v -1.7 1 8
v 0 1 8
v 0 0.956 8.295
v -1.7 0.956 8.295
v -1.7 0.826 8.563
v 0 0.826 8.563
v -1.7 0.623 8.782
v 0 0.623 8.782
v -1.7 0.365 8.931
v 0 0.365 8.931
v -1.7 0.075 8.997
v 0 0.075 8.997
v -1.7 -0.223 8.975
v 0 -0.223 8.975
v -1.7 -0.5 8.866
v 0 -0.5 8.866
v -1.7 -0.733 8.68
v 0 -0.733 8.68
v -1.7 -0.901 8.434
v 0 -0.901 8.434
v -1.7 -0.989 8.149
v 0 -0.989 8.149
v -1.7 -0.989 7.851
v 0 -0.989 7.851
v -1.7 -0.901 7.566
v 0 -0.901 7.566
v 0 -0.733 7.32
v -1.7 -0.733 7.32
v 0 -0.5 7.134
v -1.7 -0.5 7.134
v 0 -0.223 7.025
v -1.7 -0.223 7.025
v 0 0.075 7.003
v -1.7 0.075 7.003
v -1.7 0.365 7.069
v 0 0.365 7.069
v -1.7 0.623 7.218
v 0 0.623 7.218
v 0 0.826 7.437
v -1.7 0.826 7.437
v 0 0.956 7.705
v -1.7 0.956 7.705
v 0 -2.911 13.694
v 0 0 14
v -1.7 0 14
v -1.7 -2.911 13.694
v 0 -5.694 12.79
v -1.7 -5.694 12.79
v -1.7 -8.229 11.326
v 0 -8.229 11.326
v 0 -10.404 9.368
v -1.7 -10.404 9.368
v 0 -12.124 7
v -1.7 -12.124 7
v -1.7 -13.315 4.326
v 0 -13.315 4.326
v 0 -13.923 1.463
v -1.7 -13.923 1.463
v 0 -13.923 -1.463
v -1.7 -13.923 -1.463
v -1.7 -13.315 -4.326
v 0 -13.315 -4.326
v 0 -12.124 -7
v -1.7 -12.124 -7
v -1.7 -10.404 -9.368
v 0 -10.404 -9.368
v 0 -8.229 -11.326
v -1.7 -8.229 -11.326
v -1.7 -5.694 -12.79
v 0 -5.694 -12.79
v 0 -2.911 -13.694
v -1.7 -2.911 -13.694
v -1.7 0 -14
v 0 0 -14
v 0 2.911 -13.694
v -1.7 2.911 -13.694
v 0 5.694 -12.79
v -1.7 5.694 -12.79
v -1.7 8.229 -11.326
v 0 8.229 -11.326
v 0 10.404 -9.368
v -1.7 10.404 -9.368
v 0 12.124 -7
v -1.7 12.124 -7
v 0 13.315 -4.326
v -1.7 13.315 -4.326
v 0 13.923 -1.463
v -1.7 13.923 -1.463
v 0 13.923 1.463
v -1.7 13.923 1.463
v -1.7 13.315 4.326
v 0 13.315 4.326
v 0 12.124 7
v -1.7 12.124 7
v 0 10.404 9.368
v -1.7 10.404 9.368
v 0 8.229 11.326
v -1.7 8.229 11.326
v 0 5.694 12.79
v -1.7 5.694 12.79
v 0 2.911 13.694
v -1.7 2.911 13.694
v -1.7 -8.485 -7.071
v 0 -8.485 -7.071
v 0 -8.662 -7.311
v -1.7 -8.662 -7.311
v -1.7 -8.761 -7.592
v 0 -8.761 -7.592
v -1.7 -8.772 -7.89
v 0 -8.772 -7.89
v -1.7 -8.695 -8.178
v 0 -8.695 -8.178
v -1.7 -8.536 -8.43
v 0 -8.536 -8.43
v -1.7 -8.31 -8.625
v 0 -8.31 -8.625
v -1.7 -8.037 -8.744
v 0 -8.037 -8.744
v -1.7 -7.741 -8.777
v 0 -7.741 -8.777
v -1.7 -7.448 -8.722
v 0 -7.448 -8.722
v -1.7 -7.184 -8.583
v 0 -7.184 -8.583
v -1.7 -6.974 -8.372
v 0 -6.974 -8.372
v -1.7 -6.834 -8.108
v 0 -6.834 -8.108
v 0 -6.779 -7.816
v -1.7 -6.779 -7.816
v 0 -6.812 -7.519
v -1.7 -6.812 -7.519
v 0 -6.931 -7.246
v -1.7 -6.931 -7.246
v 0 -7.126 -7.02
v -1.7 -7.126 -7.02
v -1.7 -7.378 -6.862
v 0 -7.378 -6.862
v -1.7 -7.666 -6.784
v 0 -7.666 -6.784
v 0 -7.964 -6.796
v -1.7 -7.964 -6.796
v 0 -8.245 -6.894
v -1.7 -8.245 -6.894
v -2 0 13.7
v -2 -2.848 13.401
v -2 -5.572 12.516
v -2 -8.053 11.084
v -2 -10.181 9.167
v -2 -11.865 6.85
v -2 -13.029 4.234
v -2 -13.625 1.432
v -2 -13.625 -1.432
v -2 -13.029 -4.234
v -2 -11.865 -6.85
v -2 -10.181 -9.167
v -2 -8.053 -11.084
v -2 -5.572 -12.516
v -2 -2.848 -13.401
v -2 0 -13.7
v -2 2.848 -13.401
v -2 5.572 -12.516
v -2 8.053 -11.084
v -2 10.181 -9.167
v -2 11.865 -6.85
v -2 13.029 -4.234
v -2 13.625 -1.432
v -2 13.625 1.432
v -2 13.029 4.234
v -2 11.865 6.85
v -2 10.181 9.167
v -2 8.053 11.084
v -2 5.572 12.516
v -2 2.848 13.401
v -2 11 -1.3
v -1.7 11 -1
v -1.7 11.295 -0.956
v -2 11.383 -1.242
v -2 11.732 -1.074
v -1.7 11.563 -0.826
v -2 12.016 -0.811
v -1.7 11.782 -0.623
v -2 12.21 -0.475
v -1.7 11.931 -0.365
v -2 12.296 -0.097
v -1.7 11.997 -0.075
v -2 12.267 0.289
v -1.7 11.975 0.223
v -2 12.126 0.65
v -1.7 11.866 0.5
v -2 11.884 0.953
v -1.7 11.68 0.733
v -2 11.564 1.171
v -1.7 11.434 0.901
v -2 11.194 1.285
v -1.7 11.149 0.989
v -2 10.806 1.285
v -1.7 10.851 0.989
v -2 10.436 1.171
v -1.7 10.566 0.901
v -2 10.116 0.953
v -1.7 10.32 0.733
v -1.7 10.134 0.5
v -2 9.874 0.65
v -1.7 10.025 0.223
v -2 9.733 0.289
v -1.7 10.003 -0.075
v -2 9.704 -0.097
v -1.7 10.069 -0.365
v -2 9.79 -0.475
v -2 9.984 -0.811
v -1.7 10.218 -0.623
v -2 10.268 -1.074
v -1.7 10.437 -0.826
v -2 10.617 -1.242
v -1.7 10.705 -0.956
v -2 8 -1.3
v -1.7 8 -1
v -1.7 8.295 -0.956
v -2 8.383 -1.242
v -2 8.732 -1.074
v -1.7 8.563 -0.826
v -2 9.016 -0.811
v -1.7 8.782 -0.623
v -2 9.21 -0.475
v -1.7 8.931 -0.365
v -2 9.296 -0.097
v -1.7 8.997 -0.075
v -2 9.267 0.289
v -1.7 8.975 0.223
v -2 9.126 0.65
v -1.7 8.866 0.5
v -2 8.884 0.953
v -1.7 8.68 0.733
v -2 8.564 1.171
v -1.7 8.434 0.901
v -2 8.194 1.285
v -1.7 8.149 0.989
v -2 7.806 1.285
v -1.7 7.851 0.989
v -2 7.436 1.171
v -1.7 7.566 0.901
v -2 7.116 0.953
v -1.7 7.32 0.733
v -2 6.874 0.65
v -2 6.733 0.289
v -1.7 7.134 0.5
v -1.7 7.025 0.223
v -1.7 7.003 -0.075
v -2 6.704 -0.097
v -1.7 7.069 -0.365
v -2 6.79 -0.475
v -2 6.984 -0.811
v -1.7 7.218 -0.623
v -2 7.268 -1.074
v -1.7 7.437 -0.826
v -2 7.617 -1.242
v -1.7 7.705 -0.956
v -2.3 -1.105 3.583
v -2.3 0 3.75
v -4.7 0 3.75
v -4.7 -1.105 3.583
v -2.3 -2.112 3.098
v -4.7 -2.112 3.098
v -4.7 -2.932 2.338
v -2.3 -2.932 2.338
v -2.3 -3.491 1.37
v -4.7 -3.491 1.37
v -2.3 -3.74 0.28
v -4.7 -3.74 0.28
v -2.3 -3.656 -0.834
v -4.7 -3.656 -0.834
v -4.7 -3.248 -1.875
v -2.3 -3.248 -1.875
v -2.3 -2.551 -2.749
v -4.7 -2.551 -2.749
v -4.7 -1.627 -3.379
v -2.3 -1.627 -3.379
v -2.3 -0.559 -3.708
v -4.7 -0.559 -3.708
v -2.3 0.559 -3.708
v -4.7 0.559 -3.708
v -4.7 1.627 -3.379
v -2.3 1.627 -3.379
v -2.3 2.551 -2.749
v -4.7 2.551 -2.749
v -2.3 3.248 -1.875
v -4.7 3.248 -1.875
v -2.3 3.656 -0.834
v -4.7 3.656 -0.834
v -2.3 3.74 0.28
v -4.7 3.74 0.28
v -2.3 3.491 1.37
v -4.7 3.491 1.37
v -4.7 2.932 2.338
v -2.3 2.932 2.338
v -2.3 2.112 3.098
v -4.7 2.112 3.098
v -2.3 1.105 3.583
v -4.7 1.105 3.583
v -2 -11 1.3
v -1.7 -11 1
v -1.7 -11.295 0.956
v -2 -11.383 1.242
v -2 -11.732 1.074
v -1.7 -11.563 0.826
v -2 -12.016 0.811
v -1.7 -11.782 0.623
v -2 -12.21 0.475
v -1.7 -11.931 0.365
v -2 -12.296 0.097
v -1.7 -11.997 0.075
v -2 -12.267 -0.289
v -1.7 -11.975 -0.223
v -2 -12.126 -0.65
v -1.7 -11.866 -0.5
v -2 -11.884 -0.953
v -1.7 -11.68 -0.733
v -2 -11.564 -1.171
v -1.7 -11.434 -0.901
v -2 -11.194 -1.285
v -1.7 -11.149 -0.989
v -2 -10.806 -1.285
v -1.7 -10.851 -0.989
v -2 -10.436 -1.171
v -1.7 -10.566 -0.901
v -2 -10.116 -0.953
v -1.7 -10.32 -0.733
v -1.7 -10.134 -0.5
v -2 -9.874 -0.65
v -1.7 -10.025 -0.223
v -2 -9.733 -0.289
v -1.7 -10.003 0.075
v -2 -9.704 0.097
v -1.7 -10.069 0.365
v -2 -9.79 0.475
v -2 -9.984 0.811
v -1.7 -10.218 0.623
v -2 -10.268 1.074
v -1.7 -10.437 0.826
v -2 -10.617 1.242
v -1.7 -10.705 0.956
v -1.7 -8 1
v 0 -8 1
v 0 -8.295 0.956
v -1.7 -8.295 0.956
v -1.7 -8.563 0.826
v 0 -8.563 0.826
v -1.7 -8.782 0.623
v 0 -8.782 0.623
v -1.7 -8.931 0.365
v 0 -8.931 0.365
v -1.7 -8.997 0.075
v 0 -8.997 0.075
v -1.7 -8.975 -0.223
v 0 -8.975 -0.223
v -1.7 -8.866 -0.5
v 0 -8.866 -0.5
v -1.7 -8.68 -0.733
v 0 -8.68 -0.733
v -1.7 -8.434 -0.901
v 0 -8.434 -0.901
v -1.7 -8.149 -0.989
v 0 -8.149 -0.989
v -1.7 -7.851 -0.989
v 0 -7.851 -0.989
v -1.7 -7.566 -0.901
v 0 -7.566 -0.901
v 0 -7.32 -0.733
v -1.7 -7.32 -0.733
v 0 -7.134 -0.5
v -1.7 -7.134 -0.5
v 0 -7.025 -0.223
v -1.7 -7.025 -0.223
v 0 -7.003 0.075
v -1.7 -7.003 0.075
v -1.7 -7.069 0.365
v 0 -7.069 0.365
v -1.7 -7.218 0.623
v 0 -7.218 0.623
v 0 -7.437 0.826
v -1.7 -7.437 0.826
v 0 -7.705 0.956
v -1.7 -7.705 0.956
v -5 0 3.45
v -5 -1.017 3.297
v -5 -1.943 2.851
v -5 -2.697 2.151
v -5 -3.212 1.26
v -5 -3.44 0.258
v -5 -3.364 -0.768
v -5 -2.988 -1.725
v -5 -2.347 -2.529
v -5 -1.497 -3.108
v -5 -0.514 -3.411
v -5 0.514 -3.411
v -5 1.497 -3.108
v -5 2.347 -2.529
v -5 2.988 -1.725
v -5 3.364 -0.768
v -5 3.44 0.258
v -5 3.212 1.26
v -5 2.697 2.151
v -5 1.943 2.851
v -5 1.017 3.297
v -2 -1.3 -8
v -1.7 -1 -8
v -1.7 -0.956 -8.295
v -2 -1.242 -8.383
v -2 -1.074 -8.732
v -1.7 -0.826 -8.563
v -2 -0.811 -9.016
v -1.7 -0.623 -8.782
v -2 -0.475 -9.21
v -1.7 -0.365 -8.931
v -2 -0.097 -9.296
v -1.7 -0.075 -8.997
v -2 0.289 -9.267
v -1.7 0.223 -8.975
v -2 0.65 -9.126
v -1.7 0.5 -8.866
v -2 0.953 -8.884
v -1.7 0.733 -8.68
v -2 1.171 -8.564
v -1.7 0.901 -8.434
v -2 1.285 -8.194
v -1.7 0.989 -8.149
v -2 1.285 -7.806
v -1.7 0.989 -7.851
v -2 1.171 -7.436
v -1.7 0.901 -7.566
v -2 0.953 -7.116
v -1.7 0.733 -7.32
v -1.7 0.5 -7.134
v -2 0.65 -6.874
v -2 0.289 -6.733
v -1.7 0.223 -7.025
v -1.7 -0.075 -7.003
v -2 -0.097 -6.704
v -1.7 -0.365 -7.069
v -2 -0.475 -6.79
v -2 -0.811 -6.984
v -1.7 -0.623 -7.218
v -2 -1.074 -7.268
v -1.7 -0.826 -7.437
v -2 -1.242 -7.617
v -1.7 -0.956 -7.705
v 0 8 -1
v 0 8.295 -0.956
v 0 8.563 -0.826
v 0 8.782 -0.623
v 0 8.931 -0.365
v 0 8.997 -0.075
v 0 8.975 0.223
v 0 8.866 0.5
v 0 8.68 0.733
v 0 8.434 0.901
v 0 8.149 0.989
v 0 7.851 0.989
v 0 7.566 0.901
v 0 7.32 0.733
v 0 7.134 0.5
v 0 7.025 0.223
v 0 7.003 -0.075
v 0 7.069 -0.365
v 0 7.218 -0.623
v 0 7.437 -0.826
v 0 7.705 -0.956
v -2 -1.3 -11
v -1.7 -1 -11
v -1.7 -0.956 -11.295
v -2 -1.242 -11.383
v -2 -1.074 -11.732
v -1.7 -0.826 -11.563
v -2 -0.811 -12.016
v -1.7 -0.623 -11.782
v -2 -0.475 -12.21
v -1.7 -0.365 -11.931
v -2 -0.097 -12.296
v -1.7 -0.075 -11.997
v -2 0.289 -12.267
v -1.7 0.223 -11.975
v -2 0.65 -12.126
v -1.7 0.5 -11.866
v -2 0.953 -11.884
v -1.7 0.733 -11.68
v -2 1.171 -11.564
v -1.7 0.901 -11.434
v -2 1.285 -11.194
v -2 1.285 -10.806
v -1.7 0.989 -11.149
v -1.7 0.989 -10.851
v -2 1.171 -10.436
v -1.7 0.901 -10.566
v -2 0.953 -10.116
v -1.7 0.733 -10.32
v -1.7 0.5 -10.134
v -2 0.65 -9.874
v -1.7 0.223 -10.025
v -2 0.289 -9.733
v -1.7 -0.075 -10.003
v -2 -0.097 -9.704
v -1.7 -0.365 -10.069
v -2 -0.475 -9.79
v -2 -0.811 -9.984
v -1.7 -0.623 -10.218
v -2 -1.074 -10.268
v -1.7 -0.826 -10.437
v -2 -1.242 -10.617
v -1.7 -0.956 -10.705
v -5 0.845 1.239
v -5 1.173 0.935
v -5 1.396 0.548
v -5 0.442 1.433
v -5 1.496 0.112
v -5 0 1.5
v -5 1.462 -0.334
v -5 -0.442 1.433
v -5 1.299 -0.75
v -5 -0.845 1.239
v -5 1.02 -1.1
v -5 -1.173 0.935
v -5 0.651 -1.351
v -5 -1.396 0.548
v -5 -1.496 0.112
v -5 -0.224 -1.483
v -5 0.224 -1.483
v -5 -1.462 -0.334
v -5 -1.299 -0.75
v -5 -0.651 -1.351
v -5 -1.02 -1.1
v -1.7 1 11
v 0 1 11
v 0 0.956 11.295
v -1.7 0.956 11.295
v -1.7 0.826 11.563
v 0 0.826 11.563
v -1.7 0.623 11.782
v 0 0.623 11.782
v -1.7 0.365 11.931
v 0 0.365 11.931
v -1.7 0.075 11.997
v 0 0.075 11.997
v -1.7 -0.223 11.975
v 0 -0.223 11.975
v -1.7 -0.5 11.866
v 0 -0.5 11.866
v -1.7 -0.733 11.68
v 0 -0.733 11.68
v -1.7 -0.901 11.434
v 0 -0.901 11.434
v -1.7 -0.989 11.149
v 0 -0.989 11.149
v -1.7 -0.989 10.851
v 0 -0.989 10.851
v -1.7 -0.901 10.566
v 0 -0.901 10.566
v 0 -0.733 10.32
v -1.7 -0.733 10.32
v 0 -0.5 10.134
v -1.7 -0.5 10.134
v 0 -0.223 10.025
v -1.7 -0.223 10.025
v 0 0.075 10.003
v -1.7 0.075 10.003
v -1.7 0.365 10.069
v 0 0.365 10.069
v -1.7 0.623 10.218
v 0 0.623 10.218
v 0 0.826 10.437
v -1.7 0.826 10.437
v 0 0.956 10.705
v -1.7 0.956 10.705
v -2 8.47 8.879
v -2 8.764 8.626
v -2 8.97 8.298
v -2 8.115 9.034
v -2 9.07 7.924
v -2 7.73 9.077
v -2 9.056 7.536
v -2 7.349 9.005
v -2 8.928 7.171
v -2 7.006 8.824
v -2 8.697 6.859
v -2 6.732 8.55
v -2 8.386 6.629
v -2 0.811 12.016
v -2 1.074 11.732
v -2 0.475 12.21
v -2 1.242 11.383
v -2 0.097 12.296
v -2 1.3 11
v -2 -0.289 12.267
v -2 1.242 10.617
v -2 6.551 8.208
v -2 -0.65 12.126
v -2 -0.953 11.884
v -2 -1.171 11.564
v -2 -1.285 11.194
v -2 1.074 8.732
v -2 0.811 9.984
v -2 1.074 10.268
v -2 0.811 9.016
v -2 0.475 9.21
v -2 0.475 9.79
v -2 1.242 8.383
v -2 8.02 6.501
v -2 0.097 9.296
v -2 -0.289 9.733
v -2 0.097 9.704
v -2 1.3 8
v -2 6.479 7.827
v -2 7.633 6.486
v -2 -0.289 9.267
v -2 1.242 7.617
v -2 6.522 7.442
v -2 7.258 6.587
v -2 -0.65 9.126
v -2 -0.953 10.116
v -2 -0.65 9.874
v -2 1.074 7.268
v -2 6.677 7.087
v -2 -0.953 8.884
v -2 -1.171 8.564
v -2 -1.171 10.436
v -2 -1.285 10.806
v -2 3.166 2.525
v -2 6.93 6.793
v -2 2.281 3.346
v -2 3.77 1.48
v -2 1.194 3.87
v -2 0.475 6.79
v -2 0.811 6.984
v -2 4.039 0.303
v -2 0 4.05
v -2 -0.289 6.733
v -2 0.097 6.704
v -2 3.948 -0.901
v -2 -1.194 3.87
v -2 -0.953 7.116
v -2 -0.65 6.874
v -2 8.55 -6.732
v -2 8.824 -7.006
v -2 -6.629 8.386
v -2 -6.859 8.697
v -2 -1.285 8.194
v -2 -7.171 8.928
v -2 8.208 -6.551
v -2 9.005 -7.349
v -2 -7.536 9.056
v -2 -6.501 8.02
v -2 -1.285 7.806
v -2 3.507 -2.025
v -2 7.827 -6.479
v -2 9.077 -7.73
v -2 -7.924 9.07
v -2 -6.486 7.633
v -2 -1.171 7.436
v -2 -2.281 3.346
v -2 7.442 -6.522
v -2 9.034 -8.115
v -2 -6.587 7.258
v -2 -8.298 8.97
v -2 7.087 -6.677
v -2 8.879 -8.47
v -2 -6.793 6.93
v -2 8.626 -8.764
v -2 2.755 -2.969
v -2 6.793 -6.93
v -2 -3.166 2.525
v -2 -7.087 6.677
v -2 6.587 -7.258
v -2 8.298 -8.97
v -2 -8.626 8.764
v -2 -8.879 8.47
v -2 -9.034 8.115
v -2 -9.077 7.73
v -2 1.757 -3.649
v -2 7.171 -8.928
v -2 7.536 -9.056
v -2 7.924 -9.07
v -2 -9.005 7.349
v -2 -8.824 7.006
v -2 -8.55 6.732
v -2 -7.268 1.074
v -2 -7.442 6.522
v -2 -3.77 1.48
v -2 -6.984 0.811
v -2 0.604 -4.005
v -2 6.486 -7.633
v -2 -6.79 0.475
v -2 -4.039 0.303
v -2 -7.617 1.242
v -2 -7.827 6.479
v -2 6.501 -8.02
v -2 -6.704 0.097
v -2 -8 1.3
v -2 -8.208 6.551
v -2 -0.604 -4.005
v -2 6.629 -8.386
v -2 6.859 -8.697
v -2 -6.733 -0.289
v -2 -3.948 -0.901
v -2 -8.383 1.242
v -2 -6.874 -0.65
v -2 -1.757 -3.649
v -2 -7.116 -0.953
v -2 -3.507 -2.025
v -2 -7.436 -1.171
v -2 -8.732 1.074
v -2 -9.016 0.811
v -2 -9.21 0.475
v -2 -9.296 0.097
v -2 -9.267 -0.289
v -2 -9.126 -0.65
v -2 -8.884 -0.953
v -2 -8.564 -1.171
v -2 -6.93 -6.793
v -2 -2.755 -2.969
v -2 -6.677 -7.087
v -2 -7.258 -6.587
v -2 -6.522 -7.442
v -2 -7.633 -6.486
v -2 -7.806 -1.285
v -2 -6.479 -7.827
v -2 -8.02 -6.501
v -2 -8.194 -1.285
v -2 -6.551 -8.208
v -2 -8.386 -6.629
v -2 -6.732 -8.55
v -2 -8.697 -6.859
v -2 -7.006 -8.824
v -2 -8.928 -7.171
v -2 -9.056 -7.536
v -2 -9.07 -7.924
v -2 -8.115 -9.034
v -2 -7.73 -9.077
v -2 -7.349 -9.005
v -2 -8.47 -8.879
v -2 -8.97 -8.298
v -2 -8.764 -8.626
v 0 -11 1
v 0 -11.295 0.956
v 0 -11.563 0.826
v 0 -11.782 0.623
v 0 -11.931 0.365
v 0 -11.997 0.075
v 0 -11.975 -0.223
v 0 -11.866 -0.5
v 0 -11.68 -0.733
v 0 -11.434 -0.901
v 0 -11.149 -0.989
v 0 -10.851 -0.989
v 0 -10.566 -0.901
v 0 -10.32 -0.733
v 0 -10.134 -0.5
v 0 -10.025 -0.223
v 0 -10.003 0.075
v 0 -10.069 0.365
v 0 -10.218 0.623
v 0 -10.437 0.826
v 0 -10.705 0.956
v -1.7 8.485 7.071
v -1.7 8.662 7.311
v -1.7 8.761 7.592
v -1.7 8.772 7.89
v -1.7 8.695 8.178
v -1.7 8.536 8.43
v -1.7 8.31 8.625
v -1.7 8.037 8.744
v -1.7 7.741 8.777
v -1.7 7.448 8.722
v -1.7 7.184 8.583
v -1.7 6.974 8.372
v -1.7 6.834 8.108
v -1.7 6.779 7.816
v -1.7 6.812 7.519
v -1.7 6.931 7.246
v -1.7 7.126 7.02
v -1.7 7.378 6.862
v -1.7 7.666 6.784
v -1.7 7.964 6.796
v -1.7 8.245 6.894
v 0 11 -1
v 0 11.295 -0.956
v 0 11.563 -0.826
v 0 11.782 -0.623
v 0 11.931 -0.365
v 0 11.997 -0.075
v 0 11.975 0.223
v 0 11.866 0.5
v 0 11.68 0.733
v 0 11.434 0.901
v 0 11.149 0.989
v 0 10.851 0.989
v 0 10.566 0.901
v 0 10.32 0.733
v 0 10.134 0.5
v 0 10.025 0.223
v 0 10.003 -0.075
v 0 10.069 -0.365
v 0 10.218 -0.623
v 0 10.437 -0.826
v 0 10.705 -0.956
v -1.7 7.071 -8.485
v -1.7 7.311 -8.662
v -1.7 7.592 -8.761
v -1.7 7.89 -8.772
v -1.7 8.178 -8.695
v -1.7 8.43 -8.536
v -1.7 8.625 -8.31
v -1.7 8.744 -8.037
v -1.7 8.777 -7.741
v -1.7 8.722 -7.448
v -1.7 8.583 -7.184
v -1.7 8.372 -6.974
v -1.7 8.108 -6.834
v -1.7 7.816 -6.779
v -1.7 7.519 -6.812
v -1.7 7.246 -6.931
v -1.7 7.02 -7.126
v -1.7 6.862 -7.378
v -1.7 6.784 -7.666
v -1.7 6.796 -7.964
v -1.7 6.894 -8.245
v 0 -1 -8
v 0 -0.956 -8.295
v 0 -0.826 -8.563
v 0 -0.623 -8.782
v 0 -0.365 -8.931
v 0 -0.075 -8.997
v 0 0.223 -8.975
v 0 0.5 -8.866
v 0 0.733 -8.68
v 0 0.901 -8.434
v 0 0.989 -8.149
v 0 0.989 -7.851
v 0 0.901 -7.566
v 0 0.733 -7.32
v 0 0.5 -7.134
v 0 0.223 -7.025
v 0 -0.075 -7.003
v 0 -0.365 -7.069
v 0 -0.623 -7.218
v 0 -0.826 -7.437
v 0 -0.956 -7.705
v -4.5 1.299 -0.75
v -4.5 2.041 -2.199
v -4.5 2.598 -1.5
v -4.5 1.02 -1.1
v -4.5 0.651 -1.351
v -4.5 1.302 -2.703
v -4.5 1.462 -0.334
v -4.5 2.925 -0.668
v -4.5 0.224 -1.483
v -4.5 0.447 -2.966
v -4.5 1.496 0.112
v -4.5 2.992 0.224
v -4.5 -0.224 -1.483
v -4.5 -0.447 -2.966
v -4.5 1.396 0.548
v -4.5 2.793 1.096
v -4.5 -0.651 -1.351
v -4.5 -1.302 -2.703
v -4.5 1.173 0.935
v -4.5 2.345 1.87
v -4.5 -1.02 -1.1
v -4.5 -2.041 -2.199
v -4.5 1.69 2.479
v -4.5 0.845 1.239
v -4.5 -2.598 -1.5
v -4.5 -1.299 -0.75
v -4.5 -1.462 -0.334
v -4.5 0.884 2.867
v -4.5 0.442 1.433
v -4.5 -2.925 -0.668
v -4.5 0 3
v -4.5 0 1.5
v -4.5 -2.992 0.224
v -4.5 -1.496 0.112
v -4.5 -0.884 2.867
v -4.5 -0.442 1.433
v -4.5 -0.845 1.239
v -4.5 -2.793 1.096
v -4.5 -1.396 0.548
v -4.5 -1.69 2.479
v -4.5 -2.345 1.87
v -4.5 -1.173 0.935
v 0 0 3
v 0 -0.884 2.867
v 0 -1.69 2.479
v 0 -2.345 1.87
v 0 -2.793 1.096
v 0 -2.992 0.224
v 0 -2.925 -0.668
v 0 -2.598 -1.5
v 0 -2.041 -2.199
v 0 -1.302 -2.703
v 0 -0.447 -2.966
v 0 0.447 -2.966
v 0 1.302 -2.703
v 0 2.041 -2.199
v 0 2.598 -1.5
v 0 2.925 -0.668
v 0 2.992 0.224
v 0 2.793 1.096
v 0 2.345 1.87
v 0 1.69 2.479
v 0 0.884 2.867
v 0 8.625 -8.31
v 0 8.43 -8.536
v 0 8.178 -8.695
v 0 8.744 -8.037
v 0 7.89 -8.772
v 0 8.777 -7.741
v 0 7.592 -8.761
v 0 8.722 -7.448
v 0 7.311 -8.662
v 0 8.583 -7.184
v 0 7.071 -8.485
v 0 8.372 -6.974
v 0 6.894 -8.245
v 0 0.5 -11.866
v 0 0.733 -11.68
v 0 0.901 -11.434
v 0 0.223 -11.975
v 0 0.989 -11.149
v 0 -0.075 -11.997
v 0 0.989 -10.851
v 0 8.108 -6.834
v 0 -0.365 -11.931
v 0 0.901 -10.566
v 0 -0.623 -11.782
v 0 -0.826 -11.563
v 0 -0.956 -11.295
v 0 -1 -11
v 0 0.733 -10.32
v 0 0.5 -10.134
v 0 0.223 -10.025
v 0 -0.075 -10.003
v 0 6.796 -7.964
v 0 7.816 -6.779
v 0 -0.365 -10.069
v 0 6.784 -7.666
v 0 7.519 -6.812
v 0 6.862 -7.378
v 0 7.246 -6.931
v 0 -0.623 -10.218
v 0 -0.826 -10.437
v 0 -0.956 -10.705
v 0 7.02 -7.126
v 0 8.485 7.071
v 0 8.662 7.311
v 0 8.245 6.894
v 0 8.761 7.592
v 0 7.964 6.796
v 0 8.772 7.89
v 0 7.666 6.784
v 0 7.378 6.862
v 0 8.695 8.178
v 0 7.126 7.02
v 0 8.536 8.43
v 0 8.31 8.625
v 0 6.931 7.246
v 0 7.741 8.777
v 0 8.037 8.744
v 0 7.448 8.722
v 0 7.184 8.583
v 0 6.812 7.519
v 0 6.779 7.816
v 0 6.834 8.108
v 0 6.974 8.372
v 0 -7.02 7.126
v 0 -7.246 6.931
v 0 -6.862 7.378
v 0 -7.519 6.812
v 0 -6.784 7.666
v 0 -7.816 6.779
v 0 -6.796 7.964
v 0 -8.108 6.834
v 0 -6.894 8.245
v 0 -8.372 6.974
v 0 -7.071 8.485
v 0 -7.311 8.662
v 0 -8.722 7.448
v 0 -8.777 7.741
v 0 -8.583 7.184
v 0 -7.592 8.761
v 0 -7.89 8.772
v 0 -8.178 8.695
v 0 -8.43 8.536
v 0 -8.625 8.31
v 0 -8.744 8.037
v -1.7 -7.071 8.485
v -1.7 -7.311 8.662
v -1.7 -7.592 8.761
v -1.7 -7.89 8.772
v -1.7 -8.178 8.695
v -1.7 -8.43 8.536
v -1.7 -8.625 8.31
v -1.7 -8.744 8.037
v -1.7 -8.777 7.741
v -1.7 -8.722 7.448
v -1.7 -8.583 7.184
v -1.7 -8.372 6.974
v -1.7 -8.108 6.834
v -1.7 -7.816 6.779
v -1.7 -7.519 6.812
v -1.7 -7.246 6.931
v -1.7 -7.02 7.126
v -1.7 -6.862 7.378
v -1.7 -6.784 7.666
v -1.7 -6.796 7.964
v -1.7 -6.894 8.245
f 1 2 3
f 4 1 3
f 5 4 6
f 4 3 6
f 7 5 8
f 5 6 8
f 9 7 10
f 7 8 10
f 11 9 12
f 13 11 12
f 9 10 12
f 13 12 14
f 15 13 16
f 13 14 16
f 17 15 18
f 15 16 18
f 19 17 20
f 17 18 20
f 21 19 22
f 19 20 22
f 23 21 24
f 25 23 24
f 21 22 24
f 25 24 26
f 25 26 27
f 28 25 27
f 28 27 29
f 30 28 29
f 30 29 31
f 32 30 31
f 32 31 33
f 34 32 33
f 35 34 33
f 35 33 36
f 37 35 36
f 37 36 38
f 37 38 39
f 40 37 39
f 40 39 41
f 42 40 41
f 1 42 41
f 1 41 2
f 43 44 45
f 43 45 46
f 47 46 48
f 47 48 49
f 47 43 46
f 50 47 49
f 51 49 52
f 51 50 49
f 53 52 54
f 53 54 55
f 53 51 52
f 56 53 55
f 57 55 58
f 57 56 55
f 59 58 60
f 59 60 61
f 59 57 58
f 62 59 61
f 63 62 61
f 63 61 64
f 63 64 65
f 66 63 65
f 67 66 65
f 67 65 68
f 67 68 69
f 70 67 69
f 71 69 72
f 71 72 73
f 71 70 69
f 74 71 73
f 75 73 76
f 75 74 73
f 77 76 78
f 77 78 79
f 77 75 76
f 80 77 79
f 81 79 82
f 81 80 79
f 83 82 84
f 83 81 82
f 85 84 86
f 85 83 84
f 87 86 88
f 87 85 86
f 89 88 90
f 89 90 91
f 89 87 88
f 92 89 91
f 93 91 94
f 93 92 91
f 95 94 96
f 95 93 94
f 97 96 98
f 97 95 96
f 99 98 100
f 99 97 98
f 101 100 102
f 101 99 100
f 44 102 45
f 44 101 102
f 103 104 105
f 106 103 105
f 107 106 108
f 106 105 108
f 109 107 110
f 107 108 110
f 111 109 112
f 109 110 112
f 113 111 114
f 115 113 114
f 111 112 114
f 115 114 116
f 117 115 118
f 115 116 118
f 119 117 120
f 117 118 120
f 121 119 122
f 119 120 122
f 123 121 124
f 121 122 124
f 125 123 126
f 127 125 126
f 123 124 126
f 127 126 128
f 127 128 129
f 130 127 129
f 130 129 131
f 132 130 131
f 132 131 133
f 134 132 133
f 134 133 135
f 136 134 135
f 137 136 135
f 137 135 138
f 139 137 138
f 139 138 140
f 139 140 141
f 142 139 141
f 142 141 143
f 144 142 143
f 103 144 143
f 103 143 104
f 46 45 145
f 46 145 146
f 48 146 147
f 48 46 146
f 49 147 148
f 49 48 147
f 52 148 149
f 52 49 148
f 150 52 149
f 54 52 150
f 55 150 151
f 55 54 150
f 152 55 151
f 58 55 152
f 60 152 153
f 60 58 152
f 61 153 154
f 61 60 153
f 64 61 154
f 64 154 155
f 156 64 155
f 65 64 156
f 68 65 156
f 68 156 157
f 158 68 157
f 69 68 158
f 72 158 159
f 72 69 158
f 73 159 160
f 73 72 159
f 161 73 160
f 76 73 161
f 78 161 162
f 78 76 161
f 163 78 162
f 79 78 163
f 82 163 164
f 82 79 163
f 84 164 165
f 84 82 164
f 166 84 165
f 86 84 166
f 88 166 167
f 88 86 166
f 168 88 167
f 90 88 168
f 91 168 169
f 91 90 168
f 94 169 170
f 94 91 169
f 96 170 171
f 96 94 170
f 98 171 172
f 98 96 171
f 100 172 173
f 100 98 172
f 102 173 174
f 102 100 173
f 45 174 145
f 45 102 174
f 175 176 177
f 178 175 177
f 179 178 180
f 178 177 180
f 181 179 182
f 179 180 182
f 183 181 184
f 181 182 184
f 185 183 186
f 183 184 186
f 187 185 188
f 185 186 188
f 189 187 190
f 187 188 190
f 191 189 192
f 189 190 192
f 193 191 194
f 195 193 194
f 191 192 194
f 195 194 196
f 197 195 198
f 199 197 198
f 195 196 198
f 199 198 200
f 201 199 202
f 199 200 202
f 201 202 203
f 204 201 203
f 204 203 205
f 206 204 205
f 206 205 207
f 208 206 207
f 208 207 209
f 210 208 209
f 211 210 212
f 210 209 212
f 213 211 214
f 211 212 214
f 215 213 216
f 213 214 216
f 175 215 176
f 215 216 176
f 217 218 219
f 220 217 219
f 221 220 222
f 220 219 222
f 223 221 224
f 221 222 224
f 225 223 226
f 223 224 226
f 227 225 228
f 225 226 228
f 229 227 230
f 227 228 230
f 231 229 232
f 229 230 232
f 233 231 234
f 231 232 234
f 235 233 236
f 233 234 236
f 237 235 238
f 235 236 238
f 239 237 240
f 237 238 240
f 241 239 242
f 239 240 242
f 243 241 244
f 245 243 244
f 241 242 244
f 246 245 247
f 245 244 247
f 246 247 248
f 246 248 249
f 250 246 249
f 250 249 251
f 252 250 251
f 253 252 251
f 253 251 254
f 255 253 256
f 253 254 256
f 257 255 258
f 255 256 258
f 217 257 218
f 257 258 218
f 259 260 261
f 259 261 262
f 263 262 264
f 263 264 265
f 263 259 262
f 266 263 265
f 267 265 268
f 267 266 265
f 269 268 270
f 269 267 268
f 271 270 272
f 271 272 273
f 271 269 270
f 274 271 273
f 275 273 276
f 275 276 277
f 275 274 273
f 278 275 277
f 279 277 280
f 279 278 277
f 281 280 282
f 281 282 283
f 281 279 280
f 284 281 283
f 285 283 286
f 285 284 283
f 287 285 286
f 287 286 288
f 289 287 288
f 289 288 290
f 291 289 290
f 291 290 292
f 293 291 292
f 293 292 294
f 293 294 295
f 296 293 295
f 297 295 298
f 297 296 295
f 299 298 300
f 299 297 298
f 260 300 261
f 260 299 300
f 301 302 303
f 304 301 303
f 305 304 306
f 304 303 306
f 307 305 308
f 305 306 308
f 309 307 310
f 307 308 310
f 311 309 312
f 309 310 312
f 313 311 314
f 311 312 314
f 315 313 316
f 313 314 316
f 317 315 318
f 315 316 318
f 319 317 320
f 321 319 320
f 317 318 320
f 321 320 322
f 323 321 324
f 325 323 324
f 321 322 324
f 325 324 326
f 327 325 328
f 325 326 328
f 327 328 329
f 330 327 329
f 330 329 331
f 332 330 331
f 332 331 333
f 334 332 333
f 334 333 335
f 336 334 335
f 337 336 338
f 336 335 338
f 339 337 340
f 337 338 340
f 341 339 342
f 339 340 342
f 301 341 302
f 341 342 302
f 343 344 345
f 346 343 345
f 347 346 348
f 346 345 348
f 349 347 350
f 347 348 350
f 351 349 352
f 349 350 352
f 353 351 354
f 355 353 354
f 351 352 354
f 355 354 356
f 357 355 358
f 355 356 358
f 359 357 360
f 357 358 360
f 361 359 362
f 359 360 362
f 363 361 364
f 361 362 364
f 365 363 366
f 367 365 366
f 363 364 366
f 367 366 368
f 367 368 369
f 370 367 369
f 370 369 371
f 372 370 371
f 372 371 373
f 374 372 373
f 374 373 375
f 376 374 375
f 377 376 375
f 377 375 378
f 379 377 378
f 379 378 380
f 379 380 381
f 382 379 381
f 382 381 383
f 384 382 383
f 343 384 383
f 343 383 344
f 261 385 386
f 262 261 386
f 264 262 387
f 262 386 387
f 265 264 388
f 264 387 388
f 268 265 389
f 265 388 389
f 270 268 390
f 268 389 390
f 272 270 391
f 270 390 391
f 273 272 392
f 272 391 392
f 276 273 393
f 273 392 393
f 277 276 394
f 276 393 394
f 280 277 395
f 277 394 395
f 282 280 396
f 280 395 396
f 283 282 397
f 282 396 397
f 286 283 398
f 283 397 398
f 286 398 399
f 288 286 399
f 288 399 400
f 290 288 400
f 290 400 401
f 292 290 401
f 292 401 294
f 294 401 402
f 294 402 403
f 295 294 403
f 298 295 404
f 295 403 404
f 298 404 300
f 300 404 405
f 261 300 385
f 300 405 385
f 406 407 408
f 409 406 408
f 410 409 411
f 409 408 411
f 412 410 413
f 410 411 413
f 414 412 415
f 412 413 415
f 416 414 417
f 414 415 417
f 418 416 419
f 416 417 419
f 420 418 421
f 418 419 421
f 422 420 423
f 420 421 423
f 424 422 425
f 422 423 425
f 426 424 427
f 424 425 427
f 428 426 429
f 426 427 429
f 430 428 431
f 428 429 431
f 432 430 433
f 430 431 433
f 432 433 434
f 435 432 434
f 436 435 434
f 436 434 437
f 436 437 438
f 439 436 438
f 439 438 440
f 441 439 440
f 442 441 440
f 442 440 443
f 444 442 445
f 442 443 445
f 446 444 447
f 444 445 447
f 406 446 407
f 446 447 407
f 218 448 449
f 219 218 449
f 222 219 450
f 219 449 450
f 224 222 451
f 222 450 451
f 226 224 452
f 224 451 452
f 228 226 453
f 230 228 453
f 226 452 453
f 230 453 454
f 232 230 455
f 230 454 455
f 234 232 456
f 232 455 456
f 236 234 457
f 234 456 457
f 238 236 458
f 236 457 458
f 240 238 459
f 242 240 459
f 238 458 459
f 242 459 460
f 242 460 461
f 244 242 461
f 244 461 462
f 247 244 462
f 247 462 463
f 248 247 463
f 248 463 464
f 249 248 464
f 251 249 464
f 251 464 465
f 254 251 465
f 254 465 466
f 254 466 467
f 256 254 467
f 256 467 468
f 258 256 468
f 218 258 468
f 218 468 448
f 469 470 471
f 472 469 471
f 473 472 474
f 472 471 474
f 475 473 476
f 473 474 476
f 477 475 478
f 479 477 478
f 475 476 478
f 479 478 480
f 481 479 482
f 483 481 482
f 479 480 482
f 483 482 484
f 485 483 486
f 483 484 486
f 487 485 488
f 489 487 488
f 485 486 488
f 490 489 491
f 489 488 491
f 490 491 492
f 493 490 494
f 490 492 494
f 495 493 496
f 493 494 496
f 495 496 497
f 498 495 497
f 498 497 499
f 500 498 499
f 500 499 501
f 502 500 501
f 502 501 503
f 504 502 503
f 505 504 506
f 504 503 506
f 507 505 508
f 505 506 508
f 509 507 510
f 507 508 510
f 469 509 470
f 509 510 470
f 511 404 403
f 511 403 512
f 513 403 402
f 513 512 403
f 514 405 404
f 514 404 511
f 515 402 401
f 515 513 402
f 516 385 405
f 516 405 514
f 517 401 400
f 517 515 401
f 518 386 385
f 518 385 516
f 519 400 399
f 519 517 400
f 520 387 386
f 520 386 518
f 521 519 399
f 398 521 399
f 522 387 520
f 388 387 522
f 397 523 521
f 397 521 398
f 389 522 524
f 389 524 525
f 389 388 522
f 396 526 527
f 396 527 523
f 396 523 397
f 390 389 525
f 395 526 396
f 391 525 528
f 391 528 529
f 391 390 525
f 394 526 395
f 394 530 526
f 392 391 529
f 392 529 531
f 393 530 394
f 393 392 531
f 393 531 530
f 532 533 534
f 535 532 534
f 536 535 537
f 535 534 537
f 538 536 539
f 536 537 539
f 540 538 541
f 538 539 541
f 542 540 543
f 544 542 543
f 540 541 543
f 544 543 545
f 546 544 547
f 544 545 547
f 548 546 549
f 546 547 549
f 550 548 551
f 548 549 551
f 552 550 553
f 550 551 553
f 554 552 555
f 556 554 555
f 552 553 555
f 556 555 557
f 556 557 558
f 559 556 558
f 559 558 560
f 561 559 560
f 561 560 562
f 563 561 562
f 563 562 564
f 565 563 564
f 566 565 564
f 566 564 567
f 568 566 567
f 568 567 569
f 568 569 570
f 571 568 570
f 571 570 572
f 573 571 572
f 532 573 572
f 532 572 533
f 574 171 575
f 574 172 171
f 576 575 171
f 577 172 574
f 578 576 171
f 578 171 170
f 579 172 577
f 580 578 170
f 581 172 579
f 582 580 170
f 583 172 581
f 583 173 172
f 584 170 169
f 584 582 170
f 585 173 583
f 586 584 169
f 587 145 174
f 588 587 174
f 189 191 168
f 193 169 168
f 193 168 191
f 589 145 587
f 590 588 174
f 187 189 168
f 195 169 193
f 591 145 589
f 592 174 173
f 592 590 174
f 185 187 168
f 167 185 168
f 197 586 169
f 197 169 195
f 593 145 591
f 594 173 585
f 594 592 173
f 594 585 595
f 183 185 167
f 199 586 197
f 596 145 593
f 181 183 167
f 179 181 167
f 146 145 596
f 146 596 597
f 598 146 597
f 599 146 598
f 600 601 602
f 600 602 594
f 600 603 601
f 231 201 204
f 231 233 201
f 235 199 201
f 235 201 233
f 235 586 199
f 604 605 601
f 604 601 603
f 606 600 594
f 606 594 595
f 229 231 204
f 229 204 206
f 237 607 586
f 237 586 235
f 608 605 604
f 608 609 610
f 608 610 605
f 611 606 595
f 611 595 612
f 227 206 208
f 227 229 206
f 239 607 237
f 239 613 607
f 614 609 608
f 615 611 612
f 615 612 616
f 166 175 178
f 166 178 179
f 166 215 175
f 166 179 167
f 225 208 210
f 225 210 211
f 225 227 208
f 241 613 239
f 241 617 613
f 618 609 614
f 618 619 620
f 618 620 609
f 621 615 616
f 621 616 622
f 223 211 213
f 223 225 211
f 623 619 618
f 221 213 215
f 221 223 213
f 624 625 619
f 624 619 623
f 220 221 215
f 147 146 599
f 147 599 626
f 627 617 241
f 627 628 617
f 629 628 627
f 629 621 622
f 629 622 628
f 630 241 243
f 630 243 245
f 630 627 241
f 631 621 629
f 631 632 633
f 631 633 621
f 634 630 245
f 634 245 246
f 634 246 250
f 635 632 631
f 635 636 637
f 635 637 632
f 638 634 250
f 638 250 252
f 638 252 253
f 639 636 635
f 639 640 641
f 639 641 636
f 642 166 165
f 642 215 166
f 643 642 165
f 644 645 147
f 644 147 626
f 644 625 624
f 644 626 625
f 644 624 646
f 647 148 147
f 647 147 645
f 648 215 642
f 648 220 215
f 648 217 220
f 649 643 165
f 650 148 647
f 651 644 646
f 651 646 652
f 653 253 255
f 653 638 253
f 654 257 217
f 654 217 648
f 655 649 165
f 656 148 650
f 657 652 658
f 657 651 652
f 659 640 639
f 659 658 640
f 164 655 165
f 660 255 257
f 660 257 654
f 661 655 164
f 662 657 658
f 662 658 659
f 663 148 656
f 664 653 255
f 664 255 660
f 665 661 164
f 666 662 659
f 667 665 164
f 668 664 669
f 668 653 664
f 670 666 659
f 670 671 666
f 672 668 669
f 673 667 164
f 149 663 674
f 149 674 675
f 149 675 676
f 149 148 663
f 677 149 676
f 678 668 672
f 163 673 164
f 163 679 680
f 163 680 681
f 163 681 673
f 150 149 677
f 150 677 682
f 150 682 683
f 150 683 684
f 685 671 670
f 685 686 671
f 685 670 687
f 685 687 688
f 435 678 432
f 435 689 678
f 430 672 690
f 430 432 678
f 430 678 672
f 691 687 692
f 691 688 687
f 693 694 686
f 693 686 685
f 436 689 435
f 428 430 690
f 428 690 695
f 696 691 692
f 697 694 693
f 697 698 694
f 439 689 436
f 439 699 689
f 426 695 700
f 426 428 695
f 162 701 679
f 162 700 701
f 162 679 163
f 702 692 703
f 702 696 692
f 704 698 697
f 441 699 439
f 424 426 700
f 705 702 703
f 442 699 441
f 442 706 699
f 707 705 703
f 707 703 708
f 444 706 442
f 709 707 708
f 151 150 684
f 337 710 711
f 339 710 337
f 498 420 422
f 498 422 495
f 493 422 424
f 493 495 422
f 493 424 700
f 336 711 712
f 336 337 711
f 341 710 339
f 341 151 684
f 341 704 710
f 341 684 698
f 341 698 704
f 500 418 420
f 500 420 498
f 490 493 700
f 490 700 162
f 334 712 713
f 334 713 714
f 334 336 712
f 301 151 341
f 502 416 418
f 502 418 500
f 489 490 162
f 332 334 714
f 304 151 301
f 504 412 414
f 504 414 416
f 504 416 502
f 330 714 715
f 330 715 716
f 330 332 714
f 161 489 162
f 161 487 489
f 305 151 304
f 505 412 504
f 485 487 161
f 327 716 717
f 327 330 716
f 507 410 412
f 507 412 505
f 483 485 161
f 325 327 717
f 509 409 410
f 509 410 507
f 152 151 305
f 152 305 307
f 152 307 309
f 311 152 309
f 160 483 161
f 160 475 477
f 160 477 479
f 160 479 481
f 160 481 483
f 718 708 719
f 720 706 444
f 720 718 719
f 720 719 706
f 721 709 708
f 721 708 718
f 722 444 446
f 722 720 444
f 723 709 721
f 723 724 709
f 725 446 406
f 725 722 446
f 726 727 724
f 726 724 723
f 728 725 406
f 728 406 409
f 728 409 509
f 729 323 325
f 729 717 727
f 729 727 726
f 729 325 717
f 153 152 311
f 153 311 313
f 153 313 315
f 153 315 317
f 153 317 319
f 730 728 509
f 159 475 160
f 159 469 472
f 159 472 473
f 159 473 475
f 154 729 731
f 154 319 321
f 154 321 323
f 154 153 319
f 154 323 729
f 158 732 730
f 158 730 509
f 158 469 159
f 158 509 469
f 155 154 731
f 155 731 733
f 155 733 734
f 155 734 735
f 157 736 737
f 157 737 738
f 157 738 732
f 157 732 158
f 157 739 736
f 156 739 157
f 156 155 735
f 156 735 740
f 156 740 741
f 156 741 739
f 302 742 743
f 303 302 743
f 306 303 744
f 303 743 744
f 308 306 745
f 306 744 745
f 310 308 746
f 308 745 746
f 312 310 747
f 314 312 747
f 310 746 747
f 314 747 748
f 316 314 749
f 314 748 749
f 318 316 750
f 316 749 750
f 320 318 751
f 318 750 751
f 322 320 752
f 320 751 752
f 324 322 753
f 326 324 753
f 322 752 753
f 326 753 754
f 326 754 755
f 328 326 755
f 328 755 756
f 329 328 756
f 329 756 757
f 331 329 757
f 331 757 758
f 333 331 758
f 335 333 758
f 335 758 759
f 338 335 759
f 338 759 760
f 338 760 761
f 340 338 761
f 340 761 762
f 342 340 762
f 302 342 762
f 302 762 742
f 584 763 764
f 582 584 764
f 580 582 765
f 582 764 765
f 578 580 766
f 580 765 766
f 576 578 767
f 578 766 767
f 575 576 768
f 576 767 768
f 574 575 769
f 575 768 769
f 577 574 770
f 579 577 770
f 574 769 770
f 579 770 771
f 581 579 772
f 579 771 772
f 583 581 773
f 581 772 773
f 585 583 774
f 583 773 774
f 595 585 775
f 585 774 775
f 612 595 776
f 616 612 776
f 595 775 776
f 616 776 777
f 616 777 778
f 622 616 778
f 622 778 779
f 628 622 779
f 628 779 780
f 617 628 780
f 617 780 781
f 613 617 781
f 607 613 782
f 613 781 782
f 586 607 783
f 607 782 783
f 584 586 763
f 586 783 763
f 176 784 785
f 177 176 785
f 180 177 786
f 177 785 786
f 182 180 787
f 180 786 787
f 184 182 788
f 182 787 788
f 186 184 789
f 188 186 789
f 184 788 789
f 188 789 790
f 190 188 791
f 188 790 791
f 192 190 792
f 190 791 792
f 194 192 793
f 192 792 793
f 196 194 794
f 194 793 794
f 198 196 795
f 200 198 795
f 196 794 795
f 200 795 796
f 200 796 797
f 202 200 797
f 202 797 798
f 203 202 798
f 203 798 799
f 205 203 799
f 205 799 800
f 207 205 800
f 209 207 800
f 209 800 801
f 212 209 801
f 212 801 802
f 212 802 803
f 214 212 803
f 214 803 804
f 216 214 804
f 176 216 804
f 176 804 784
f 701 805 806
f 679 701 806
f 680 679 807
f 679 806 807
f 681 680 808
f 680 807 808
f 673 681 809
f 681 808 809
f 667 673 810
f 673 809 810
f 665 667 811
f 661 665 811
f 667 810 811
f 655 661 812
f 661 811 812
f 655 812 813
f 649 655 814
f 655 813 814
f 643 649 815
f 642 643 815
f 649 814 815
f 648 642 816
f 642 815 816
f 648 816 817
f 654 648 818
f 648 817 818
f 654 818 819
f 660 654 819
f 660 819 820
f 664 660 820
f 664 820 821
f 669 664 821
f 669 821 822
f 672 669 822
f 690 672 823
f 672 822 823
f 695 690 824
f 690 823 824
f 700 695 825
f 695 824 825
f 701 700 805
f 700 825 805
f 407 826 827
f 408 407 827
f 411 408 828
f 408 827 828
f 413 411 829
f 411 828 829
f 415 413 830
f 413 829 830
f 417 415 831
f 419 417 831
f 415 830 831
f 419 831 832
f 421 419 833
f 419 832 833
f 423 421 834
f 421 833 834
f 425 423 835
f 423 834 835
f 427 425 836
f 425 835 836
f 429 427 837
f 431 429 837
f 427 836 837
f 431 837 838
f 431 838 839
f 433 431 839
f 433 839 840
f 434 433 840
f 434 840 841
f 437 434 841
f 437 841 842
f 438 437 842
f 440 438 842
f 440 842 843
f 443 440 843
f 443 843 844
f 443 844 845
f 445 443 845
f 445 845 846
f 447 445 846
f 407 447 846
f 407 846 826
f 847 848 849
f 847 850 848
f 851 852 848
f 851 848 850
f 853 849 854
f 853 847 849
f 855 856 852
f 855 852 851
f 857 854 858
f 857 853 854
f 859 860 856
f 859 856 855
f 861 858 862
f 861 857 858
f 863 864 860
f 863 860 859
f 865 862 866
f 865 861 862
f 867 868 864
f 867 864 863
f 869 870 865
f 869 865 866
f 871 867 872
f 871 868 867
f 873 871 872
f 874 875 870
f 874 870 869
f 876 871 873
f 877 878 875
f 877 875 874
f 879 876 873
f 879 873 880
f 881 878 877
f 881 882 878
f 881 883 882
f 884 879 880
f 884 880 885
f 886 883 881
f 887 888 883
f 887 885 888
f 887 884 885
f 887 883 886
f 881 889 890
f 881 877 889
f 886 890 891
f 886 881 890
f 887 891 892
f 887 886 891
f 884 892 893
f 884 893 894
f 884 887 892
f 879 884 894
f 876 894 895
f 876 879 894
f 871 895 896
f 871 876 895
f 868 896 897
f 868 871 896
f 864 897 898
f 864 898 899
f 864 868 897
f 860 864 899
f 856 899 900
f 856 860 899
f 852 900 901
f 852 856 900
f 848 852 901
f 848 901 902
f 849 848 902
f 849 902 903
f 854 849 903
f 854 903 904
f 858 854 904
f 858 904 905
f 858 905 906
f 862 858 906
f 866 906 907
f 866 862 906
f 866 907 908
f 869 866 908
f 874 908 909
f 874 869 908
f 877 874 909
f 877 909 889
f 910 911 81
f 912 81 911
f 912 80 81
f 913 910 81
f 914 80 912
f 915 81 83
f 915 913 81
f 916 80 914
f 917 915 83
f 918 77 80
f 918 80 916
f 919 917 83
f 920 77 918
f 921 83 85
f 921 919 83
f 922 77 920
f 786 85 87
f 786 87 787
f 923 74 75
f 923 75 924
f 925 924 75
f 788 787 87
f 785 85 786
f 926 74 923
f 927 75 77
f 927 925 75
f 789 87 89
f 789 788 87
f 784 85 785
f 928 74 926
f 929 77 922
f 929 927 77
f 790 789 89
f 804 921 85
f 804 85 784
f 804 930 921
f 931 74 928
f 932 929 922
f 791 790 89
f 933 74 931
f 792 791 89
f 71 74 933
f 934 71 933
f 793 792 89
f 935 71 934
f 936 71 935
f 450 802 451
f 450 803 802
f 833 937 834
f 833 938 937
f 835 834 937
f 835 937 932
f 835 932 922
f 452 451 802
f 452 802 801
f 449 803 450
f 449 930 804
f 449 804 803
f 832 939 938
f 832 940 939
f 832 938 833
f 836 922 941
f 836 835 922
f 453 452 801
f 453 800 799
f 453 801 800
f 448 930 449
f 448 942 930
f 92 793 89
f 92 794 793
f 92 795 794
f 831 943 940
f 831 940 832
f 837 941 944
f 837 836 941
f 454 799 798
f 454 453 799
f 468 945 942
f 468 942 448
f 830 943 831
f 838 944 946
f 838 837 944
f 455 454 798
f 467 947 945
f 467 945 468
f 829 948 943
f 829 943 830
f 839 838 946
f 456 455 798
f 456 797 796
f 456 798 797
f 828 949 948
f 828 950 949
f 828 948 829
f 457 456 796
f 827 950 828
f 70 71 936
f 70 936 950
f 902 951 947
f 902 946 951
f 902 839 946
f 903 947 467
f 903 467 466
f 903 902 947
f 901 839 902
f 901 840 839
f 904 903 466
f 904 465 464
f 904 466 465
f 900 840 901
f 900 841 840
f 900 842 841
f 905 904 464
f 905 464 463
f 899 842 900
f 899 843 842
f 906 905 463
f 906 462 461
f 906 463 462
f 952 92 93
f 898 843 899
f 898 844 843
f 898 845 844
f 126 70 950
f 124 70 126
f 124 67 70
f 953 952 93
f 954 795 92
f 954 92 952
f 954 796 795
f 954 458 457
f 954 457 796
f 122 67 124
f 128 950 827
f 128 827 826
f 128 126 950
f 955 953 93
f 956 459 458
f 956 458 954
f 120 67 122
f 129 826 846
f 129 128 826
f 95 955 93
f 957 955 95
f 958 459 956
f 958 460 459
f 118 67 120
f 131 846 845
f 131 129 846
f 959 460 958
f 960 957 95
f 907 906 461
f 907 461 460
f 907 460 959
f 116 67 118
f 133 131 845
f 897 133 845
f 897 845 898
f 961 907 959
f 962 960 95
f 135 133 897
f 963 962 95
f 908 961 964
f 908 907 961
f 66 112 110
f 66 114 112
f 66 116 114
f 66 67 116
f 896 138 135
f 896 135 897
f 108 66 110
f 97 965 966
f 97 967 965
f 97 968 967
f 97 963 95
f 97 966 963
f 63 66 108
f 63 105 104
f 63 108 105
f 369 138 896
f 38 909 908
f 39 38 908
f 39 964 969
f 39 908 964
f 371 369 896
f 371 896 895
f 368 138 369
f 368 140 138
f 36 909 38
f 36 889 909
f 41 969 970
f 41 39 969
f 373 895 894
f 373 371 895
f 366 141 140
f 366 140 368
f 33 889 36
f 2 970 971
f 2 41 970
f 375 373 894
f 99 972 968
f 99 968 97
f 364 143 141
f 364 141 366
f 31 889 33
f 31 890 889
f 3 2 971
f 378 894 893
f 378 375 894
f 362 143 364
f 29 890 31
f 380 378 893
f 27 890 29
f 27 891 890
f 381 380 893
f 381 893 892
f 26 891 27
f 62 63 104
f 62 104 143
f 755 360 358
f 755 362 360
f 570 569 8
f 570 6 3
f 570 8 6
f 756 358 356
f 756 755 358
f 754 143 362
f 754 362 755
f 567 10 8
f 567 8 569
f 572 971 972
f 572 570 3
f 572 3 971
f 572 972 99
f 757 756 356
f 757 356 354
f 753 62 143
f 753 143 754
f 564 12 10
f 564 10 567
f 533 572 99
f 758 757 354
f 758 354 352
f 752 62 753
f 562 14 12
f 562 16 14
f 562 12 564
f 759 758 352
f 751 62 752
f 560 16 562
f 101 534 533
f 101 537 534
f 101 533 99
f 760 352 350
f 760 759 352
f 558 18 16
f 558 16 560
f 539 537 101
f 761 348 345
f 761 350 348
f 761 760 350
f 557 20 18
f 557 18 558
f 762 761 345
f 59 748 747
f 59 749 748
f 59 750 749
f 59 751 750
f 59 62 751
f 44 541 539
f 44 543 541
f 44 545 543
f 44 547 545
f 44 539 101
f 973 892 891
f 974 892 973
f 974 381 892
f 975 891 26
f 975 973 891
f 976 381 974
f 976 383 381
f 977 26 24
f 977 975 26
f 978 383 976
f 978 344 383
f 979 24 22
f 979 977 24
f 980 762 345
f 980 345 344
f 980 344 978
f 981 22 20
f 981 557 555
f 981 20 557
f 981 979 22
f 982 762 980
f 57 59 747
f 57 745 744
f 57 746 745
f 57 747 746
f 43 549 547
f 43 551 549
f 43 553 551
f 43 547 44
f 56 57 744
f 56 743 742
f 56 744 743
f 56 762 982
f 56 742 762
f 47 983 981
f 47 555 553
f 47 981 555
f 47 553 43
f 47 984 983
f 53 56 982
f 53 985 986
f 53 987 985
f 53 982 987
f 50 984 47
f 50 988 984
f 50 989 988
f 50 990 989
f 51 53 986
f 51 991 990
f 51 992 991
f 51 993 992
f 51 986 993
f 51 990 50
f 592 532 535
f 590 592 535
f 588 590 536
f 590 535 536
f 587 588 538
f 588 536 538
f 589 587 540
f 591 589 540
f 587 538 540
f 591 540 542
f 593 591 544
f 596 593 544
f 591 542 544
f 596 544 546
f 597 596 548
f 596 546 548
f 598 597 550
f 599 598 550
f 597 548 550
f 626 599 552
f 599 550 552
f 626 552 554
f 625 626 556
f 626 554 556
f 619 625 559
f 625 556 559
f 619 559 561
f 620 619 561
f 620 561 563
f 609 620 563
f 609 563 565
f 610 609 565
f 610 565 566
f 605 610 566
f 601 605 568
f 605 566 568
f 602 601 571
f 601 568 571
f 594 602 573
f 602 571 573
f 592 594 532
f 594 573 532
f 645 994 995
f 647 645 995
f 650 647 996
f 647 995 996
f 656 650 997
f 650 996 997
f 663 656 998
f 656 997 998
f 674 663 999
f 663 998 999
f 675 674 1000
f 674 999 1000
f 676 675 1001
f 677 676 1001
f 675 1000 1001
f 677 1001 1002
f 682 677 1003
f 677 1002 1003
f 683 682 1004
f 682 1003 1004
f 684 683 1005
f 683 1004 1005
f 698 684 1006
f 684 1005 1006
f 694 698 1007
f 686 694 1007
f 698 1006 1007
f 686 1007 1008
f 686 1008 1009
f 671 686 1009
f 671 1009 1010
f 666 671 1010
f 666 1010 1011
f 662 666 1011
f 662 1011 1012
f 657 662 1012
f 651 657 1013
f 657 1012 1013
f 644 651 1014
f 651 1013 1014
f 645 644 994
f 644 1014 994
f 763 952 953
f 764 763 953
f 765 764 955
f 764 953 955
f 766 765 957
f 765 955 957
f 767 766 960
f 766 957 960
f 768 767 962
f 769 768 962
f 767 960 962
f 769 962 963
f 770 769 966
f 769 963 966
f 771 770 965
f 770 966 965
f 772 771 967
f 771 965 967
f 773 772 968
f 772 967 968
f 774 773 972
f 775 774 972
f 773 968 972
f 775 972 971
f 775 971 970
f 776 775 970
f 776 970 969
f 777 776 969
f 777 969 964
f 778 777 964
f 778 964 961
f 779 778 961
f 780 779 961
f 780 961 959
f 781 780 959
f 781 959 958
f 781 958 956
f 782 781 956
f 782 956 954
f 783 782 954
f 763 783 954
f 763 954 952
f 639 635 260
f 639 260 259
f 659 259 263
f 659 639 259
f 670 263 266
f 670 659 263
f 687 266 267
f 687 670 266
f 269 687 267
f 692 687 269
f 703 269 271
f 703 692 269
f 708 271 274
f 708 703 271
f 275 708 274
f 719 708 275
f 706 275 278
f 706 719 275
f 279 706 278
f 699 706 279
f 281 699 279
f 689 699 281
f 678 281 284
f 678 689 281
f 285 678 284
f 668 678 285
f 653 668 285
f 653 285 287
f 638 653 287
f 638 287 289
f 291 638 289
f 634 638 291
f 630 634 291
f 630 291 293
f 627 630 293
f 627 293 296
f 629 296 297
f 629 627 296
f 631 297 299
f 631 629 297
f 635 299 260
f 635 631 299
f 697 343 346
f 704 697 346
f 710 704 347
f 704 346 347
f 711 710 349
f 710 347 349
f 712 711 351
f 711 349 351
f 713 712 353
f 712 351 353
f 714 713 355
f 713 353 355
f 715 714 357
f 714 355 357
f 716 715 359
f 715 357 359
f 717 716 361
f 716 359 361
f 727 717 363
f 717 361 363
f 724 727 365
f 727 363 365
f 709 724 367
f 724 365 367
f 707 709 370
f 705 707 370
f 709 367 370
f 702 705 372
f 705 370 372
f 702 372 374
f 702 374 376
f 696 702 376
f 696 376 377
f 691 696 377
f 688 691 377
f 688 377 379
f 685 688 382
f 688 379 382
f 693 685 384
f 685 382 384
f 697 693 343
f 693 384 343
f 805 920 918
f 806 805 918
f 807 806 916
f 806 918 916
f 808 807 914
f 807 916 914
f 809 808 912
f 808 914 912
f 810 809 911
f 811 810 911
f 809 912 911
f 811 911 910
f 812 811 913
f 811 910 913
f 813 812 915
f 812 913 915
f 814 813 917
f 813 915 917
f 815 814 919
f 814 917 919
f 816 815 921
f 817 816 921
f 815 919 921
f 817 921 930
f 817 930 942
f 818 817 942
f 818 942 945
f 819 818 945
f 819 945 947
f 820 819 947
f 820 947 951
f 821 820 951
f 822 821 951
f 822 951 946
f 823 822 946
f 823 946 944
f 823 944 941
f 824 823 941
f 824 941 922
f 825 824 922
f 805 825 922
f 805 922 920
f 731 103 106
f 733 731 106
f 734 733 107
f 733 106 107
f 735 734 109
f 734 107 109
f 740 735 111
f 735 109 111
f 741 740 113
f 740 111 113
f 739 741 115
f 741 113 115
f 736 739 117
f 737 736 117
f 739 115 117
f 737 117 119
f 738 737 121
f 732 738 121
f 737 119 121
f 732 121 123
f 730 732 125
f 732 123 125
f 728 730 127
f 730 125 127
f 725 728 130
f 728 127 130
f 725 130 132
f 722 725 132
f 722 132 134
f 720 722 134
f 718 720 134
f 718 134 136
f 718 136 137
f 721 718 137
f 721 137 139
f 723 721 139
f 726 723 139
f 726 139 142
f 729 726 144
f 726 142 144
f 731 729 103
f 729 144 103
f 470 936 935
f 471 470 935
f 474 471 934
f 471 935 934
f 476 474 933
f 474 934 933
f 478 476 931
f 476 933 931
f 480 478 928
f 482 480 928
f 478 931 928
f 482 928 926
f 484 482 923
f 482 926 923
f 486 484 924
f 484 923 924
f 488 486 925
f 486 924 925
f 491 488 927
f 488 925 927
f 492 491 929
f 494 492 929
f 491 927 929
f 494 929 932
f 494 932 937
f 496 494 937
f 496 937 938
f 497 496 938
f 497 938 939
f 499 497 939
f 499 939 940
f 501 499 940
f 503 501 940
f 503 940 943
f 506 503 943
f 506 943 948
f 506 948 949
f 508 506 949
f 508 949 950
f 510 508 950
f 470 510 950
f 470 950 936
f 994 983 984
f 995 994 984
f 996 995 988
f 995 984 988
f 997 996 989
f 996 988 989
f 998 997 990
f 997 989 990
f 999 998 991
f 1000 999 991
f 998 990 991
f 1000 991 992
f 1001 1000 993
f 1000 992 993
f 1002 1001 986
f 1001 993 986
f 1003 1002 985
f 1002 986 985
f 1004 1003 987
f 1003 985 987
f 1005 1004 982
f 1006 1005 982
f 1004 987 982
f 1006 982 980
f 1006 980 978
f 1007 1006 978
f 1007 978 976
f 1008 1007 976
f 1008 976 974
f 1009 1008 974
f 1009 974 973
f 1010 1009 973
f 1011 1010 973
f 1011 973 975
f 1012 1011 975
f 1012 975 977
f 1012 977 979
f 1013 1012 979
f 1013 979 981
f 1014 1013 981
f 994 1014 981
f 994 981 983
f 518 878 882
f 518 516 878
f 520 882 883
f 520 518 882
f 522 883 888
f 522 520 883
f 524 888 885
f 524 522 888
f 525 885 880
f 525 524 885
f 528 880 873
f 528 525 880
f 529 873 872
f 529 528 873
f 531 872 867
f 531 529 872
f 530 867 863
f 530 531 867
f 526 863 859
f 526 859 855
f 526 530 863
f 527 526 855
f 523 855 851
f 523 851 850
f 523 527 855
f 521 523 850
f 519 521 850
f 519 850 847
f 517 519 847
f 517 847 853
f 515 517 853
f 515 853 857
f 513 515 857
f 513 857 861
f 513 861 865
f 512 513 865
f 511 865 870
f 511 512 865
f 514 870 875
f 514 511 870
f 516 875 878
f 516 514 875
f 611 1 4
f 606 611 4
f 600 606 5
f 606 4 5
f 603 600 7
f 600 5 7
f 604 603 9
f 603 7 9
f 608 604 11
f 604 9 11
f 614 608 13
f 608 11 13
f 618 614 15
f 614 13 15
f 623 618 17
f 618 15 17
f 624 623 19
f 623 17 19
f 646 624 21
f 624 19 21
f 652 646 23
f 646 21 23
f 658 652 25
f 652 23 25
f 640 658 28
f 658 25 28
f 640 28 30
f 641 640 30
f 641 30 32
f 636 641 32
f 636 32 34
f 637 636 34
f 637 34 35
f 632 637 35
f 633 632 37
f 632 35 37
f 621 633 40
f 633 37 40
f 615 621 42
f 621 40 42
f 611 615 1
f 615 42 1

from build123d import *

# Parameters (mm, degrees)
SKETCH2_R          = 1
CUT_EXTRUDE1_DEPTH = 21.420577857
CIRPATTERN2_COUNT  = 8
SKETCH3_R          = 1
CUT_EXTRUDE2_DEPTH = 21.420577857
CIRPATTERN3_COUNT  = 4
CHAMFER1_SIZE      = 0.3


with BuildPart() as part:
    # Sketch1 → Revolve1 (revolve)
    with BuildSketch(Plane.XY):
        Polygon((-5, 3.75), (-2, 3.75), (-2, 14), (0, 14), (0, 3), (-4.5, 3), (-4.5, 1.5), (-5, 1.5), align=None)
    revolve(axis=Axis((0, 0, 0), (1, 0, 0)))

    # Sketch2 → Cut-Extrude1 (cut, through all)
    with BuildSketch(Plane(origin=(0, 0, 0), x_dir=(0, 0, -1), z_dir=(1, 0, 0))):
        with Locations((0, 11)):
            Circle(SKETCH2_R)
    cut_extrude1 = extrude(amount=-CUT_EXTRUDE1_DEPTH, mode=Mode.SUBTRACT)

    # CirPattern2: Cut-Extrude1 ×8 about axis
    cirpattern2_axis = Axis((0, 0, 0), (-1, 0, 0))
    for i in range(1, CIRPATTERN2_COUNT):
        add(cut_extrude1.rotate(cirpattern2_axis, i * 360 / CIRPATTERN2_COUNT), mode=Mode.SUBTRACT)

    # Sketch3 → Cut-Extrude2 (cut, through all)
    with BuildSketch(Plane(origin=(0, 0, 0), x_dir=(0, 0, -1), z_dir=(1, 0, 0))):
        with Locations((0, 8)):
            Circle(SKETCH3_R)
    cut_extrude2 = extrude(amount=-CUT_EXTRUDE2_DEPTH, mode=Mode.SUBTRACT)

    # CirPattern3: Cut-Extrude2 ×4 about axis
    cirpattern3_axis = Axis((0, 0, 0), (-1, 0, 0))
    for i in range(1, CIRPATTERN3_COUNT):
        add(cut_extrude2.rotate(cirpattern3_axis, i * 360 / CIRPATTERN3_COUNT), mode=Mode.SUBTRACT)

    # Chamfer1
    chamfer1_edges = [part.edges().sort_by_distance(p)[0] for p in [
        (-2, -14, 0),
        (-2, -3.75, 0),
        (-2, 11, 1),
        (-2, 8.485281374, -7.071067812),
        (-2, 1, -11),
        (-2, -7.071067812, -8.485281374),
        (-2, -11, -1),
        (-2, -8.485281374, 7.071067812),
        (-2, -1, 11),
        (-2, 7.071067812, 8.485281374),
        (-2, 8, 1),
        (-2, 1, -8),
        (-2, -8, -1),
        (-2, -1, 8),
        (-5, -3.75, 0),
    ]]
    chamfer(chamfer1_edges, length=CHAMFER1_SIZE)


solid = part.part
